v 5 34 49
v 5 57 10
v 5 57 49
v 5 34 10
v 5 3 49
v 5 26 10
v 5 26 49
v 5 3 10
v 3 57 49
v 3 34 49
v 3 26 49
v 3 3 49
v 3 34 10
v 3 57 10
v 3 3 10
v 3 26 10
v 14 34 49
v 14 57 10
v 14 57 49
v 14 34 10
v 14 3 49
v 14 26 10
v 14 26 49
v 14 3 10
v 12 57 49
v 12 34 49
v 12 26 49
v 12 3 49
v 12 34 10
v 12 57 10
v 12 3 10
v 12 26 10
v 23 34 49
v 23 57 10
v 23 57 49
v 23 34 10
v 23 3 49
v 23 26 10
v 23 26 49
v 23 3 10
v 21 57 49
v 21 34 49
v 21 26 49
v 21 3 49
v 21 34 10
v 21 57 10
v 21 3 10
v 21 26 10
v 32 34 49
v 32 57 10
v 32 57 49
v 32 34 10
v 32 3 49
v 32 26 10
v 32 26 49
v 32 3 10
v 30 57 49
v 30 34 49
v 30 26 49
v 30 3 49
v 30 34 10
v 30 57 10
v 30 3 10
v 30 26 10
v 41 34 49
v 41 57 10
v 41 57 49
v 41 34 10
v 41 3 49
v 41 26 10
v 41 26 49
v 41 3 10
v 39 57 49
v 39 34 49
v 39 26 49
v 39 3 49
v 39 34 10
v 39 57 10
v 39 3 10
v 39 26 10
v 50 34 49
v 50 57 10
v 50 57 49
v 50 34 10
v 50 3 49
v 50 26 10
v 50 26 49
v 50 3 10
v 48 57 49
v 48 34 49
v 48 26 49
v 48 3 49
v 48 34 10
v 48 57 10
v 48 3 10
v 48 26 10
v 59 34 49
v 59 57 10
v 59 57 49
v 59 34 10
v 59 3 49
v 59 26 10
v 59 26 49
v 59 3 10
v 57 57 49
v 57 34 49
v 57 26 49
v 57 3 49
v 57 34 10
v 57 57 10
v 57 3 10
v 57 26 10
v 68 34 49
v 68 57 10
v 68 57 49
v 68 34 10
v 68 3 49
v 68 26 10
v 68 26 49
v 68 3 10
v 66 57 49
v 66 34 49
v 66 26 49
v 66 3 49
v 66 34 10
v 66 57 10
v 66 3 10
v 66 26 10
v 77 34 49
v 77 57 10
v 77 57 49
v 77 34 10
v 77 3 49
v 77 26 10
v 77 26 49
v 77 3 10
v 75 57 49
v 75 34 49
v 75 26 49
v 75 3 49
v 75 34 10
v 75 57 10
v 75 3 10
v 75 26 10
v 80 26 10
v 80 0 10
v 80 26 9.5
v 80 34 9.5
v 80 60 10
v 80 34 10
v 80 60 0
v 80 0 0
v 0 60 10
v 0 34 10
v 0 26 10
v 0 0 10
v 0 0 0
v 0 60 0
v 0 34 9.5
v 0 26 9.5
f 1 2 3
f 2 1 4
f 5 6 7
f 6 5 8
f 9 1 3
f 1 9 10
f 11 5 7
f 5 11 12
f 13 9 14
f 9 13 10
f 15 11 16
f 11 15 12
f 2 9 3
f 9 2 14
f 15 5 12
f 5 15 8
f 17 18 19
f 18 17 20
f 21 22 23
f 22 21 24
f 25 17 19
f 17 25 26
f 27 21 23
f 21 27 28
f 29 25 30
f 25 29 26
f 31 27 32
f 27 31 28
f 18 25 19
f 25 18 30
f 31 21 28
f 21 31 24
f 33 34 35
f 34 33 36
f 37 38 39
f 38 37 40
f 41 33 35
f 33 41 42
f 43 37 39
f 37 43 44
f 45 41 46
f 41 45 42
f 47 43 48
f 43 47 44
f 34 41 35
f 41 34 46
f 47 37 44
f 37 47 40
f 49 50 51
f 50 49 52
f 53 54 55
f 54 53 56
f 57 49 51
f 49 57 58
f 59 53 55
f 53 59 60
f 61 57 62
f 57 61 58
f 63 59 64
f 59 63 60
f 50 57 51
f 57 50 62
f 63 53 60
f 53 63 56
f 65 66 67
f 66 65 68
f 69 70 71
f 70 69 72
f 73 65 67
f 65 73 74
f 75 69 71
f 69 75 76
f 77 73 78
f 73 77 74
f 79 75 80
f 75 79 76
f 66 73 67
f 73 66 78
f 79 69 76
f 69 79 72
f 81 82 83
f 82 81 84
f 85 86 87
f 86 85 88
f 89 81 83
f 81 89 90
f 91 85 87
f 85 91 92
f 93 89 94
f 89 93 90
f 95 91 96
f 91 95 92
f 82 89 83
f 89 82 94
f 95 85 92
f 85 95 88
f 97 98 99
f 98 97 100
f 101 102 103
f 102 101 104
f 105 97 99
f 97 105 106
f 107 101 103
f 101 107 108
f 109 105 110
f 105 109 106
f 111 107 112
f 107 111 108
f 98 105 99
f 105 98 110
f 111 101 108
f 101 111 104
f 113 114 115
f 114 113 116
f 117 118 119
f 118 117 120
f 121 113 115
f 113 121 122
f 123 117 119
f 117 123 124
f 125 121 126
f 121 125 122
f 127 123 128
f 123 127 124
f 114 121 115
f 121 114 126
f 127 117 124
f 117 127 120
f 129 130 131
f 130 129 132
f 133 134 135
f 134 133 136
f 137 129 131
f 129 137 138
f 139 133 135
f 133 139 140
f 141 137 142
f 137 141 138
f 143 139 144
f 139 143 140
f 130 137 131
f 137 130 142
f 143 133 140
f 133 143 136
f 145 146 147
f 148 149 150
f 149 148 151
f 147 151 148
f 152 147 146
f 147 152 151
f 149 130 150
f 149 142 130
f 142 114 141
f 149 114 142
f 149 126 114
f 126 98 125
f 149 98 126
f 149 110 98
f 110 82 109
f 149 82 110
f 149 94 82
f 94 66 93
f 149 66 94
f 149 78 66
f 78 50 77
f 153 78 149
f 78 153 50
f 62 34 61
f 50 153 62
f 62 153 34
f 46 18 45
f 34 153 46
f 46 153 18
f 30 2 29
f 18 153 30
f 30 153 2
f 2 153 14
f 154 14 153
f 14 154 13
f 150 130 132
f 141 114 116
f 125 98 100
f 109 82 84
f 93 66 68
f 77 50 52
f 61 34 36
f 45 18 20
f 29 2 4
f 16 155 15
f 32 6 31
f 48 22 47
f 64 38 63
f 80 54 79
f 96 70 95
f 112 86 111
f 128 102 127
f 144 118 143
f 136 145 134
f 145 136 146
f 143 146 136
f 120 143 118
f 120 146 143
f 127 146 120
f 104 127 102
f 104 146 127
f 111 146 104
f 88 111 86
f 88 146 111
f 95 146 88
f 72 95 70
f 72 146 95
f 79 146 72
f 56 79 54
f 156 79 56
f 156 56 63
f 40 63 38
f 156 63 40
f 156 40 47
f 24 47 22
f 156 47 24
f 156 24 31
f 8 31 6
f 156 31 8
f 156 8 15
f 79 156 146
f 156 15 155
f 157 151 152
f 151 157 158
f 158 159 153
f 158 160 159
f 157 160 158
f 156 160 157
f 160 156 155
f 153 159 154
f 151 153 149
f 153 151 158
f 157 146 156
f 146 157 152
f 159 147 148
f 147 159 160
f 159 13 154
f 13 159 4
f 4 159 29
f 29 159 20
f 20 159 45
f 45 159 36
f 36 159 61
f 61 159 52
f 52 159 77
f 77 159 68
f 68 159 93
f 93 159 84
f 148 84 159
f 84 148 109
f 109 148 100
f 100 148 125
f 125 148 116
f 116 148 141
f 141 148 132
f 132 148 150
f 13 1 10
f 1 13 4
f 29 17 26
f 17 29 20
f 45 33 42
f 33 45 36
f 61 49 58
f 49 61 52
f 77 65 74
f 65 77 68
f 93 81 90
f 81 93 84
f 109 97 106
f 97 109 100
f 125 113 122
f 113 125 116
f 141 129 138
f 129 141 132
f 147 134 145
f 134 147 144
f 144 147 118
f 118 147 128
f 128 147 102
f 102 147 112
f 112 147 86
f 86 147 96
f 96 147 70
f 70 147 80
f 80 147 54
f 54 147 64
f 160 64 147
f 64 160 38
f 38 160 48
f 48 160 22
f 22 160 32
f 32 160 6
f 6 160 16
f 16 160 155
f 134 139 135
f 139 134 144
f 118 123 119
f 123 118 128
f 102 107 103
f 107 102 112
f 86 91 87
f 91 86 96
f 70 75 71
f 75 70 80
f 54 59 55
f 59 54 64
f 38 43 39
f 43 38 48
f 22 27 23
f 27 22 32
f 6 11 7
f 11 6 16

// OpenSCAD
$fn = 32;

// ----------------------------------------------------------------------
// Heatsink: slotted fin block
// ----------------------------------------------------------------------

// --- parameters (mm) ---
base_l = 80;              // base length, X
base_w = 60;              // base width, Y
base_t = 10;              // base plate thickness
fin_h = 40;               // fin height above the base
fin_t = 2;                // fin thickness
edge = 3;                 // margin from the base ends
pitch = 9;                // fin pitch
slot_w = 8;               // central slot width, Y

n_fins = floor((base_l - 2 * edge - fin_t) / pitch) + 1;  // fin count
total_h = base_t + fin_h - 1;  // overall height

difference() {
union() {
  cube([base_l, base_w, base_t]);
  for (i = [0 : n_fins - 1])
    translate([edge + i * pitch, edge, base_t - 1])
      cube([fin_t, base_w - 2 * edge, fin_h]);
}
  translate([-1, base_w / 2 - slot_w / 2, base_t - 0.5])
    cube([base_l + 2, slot_w, fin_h + 2]);
}
